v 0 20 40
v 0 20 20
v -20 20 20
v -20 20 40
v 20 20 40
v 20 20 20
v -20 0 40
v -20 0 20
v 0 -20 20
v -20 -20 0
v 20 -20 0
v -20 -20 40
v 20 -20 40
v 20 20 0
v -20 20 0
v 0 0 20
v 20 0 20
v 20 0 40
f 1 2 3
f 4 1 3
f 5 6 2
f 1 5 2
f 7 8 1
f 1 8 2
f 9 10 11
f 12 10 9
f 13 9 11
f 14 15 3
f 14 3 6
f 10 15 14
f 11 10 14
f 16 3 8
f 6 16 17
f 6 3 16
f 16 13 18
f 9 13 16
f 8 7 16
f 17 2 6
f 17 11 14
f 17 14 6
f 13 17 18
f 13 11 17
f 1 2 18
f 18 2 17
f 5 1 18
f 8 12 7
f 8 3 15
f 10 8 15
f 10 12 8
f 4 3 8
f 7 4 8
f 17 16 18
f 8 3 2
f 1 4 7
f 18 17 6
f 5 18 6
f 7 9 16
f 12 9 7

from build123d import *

# Parameters (mm, degrees)
F0_W     = 40
F0_H     = 40
F1_DEPTH = 20
F3_DEPTH = 20
F5_DEPTH = 20


with BuildPart() as f1:
    # F0 (on Top) → F1 (new body)
    with BuildSketch(Plane.XY):
        Rectangle(F0_W, F0_H)
    extrude(amount=F1_DEPTH)

    # F2 (on face) → F3 (join)
    with BuildSketch(Plane.XZ.offset(20)):
        Polygon((20, 40), (0, 20), (20, 20), align=None)
        Polygon((-20, 40), (-20, 20), (0, 20), align=None)
    extrude(amount=-F3_DEPTH)


with BuildPart() as f5:
    # F4 (on face) → F5 (new body)
    with BuildSketch(Plane.XY.offset(20)):
        Polygon((-20, 0), (0, 20), (-20, 20), align=None)
        Polygon((20, 20), (0, 20), (20, 0), align=None)
    extrude(amount=F5_DEPTH)


solid = Compound([f1.part, f5.part])
